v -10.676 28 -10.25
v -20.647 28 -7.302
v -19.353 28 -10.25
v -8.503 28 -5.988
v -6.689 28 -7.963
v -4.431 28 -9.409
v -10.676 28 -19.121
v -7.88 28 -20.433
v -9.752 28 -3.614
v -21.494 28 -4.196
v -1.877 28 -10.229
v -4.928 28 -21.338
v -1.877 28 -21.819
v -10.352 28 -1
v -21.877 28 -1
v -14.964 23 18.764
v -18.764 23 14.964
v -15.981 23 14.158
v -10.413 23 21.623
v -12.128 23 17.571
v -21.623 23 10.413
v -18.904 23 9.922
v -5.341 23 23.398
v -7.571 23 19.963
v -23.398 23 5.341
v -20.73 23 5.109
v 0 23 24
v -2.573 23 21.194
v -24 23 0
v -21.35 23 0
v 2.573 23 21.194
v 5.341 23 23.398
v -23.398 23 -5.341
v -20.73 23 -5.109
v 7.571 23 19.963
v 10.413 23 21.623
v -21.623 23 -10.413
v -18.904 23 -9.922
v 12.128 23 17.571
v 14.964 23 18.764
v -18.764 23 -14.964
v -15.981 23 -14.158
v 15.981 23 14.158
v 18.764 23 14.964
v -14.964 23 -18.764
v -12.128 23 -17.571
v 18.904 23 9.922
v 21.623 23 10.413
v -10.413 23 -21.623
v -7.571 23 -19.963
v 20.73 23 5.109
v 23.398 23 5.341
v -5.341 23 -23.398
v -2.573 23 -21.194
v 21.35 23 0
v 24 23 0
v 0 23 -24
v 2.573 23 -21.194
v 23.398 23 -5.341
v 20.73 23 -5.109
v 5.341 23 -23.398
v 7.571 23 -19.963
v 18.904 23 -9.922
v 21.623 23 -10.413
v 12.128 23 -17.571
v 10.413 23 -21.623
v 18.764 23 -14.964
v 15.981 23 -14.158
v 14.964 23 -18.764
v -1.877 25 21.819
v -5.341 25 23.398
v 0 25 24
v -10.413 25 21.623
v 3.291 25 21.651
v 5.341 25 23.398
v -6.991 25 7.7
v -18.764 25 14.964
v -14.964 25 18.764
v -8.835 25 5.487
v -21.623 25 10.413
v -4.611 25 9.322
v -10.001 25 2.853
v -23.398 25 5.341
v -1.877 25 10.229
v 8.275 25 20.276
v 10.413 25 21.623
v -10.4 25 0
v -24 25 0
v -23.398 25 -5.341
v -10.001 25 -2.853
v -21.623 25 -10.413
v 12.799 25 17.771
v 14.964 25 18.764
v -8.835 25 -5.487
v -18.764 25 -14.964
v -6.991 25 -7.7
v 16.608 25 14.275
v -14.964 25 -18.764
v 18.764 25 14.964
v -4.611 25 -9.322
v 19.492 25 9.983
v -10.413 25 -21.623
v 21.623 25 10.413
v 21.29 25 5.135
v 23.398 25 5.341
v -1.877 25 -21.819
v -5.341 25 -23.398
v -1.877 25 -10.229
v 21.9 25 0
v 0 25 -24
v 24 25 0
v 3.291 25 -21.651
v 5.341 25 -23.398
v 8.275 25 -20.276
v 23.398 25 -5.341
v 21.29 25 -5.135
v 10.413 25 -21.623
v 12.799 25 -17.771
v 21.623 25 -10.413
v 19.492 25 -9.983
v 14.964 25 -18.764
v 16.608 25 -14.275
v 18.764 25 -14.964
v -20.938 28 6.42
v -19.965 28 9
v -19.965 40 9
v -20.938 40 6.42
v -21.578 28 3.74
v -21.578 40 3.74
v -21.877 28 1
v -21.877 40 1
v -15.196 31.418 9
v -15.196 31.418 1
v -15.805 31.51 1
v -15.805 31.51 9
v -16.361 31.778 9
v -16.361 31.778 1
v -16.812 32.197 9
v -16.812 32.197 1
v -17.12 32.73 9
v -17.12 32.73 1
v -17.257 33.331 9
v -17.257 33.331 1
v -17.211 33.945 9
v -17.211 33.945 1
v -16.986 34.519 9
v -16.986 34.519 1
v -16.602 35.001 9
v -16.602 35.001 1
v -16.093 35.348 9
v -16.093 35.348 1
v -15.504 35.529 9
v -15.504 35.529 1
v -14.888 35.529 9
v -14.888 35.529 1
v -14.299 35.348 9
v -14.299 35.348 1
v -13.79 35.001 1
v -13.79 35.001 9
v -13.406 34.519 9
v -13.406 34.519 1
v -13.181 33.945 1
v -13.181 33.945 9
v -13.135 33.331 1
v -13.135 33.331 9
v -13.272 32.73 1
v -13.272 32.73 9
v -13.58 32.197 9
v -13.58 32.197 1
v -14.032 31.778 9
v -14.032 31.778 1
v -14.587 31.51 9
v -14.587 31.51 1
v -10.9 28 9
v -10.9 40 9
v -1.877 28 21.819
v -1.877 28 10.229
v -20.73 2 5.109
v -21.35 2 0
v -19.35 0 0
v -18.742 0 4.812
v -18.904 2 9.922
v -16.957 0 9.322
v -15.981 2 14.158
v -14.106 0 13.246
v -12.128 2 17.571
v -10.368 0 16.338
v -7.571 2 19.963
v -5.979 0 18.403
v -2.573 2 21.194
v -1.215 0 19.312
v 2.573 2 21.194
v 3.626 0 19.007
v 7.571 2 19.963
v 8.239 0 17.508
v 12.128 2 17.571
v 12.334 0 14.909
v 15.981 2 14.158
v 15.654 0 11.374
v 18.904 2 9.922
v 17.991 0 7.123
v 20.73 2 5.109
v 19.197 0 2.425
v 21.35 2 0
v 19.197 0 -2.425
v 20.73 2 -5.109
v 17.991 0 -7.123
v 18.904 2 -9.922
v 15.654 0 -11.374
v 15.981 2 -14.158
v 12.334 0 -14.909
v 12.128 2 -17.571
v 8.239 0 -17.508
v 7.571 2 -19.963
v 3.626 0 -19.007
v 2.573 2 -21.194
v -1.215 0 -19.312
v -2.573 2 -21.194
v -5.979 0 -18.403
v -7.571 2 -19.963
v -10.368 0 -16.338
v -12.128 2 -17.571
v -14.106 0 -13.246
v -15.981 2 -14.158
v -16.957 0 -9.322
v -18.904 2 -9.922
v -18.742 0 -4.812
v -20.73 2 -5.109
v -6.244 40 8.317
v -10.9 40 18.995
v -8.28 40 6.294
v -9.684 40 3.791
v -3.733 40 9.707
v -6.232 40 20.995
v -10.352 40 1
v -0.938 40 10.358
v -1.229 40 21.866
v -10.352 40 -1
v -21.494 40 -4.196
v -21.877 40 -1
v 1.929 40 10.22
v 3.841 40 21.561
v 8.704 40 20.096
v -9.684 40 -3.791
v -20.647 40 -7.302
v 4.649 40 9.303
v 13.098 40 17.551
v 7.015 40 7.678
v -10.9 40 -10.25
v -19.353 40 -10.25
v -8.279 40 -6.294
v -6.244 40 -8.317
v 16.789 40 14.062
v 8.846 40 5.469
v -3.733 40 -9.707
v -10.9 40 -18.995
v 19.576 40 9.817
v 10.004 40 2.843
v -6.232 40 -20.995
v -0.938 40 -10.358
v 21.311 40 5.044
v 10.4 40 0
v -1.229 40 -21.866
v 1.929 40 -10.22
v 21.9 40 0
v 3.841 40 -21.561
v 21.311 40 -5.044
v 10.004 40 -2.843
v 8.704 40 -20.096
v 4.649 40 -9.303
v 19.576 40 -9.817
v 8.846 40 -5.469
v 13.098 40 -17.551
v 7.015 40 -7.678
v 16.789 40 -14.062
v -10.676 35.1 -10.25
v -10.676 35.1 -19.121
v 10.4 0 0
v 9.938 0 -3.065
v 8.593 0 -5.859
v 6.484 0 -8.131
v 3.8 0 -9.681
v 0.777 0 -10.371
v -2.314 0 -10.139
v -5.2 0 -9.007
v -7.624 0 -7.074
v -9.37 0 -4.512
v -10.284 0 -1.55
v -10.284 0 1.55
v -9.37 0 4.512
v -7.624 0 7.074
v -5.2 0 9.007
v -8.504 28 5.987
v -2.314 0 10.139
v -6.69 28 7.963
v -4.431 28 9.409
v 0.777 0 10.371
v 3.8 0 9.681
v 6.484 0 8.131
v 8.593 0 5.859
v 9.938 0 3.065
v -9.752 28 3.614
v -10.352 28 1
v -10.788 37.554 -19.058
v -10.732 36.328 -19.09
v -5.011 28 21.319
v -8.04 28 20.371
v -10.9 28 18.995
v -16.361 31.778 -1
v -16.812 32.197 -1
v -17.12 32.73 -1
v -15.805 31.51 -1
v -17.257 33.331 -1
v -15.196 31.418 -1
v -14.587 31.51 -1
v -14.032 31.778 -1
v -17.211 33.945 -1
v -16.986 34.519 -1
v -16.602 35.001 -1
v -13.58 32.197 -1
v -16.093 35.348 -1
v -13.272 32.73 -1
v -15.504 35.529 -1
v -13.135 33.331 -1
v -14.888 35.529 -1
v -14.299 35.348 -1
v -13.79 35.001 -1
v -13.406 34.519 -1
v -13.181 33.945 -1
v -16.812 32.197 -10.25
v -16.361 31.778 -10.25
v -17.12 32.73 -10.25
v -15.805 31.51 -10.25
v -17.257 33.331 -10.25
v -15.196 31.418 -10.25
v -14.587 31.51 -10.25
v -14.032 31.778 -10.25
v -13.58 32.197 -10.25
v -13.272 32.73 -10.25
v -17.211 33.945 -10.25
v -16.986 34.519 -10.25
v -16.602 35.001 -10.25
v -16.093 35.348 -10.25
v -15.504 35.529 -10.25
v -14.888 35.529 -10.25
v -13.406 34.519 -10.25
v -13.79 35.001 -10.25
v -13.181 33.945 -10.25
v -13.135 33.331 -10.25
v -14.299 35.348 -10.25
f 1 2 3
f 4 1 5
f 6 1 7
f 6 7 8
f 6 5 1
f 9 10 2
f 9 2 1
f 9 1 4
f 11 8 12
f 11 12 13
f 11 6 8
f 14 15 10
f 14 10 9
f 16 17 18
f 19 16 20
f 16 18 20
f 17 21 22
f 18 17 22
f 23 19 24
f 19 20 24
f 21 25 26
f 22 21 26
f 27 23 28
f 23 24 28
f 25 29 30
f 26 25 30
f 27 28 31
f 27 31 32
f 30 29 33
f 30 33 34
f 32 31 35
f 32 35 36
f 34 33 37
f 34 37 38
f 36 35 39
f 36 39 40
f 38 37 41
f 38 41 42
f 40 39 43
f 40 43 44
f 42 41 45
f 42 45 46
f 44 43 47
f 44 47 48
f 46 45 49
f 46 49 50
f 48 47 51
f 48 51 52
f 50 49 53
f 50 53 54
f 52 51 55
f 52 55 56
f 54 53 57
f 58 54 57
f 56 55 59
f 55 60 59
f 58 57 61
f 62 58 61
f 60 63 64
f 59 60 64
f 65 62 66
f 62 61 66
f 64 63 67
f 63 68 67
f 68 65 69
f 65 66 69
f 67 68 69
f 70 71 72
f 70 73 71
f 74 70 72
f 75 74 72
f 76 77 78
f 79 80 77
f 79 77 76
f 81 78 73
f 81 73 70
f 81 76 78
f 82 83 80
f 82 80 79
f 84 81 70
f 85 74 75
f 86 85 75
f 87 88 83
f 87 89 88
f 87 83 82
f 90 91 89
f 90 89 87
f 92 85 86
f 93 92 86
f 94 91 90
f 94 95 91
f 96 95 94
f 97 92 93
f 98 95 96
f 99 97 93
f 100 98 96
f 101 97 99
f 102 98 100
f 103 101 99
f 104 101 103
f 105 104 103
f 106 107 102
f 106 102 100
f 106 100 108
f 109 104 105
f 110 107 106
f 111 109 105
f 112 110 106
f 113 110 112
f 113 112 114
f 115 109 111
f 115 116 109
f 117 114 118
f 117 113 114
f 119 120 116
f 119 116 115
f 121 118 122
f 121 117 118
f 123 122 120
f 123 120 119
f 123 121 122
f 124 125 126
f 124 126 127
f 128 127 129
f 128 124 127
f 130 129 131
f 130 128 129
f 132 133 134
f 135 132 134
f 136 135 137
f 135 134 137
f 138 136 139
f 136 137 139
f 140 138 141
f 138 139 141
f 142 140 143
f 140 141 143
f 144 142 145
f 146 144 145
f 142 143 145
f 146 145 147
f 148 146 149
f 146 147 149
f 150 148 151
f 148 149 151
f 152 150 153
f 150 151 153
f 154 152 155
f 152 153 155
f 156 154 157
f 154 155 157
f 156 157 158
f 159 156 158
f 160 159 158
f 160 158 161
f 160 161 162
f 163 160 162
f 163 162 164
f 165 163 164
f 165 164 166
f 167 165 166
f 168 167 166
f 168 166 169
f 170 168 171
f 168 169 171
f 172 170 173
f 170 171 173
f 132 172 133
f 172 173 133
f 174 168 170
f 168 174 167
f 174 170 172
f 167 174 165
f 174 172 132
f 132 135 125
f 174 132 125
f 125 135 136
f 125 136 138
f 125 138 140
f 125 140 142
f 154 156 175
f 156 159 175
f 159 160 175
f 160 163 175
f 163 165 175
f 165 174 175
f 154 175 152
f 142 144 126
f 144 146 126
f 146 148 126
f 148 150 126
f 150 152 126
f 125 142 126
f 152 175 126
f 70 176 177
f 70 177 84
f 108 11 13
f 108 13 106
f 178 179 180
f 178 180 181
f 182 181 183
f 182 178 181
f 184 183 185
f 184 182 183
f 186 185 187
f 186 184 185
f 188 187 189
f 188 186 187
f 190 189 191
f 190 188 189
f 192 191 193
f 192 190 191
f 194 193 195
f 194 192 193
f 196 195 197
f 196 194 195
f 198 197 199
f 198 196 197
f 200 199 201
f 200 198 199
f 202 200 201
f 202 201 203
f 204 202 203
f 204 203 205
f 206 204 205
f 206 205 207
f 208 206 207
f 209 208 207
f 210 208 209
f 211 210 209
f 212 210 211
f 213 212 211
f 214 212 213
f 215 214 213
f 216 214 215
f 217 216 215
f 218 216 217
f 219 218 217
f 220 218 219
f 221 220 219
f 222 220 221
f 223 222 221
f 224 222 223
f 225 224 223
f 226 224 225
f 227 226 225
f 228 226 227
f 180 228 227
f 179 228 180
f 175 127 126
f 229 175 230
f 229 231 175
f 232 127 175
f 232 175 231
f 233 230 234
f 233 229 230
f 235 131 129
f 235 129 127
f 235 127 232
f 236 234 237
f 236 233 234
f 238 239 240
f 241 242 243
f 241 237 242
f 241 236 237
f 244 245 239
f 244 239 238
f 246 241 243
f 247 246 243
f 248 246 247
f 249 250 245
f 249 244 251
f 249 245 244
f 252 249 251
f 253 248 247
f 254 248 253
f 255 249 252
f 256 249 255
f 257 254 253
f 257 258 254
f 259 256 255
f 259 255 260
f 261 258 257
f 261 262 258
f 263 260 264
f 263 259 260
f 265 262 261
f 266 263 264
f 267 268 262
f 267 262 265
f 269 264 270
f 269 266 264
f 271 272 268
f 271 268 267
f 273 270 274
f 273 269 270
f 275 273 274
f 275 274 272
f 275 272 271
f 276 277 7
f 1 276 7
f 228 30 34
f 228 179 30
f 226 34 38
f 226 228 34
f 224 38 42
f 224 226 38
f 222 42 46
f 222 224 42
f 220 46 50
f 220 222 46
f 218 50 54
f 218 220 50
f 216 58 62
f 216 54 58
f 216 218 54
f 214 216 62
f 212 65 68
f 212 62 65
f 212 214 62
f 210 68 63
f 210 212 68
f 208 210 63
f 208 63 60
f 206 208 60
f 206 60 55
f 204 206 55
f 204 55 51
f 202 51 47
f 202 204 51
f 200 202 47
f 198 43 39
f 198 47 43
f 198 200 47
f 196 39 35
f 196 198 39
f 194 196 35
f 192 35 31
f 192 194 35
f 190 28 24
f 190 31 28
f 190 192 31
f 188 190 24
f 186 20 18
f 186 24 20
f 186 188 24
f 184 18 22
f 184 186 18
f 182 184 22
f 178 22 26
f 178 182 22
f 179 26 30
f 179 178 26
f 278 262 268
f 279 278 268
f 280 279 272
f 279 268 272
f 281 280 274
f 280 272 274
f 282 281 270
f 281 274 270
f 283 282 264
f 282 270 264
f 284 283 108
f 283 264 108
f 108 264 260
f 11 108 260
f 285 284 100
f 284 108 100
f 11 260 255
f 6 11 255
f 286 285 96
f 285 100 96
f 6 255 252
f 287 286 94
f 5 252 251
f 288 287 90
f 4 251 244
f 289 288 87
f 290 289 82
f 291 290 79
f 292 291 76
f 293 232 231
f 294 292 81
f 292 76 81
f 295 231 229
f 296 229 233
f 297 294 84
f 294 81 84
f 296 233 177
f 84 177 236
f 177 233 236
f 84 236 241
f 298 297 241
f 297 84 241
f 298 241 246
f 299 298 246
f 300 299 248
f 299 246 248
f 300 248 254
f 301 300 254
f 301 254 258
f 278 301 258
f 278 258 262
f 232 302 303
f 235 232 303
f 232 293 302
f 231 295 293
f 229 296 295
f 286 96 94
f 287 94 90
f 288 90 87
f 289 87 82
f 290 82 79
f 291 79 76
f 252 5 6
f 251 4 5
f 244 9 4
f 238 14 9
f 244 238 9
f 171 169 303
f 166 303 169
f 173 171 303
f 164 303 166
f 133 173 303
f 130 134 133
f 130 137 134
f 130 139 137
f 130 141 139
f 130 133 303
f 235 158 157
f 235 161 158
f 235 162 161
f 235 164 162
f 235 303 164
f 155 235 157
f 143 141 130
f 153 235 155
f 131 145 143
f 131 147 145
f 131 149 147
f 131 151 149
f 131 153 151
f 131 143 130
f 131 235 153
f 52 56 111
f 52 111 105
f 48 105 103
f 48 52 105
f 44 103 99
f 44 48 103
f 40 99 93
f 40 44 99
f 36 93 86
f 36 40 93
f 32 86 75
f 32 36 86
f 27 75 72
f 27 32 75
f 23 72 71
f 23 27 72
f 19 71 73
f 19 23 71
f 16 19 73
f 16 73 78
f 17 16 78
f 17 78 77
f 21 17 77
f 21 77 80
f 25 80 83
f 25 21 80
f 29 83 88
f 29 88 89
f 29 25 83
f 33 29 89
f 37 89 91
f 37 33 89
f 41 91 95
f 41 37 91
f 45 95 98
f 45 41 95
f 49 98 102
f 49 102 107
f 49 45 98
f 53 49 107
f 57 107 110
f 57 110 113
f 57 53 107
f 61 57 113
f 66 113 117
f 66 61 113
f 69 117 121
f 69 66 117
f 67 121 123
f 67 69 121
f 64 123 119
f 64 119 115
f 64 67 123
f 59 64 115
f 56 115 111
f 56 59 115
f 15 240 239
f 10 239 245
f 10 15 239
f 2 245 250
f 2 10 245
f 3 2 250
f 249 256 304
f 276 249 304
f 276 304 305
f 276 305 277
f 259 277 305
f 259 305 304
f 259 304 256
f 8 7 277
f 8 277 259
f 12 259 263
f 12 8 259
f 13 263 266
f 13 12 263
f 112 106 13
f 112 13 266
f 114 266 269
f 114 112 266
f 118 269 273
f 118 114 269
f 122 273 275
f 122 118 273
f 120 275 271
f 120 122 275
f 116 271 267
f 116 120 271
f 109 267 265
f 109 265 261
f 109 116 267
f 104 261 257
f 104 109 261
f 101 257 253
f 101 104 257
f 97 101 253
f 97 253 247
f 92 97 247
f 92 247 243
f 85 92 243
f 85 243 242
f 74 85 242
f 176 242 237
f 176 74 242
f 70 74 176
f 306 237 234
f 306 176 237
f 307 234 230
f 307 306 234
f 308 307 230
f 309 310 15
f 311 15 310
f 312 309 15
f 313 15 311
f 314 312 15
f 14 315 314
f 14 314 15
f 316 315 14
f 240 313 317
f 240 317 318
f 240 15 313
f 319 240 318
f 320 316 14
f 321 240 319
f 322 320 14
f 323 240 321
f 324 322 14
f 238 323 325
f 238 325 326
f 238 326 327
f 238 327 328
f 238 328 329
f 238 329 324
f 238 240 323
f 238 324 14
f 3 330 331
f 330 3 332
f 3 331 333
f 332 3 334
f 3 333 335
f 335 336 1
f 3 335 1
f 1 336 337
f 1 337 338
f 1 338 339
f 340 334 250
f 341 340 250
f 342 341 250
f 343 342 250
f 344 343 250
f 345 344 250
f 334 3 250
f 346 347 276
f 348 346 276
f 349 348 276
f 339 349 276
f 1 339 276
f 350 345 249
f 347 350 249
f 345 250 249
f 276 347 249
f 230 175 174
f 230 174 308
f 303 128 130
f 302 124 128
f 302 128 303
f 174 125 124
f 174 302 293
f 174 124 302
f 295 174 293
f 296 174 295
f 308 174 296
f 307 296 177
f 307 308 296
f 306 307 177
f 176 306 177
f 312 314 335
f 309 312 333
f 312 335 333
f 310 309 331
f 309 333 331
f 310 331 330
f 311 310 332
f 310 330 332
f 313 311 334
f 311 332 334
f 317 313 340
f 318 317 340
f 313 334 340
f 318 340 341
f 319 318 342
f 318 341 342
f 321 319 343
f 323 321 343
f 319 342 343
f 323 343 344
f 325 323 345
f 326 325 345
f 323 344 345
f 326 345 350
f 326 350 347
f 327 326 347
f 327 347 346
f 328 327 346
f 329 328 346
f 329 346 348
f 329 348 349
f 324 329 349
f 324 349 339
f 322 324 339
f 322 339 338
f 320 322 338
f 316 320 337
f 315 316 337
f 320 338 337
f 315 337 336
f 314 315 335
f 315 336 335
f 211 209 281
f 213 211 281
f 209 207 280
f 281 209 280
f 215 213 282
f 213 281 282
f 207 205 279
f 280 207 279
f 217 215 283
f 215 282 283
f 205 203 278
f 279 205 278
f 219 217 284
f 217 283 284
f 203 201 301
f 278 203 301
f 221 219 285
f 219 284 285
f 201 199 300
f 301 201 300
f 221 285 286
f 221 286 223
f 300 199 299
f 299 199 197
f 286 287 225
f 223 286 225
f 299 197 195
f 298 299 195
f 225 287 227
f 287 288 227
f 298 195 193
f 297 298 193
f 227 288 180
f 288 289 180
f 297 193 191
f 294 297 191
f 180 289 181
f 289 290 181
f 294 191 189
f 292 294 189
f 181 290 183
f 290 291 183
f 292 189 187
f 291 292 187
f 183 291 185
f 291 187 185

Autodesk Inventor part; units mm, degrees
ref_plane "YZ Plane" through (0, 0, 0) normal (1, 0, 0) x (0, 1, 0)
ref_plane "XZ Plane" through (0, 0, 0) normal (0, 1, 0) x (-1, 0, 0)
ref_plane "XY Plane" through (0, 0, 0) normal (0, 0, 1) x (1, 0, 0)
sketch "Sketch1" plane through (0, 0, 0) normal (0, 1, 0) x (-1, 0, 0)
  circle A0 centre (0, 0) radius 21.35
  dimension "d0" = 42.7
extrude "Extrusion1" add sketch "Sketch1" along normal blind 23
sketch "Sketch2" plane through (0, 23, 0) normal (0, 1, 0) x (1, 0, 0)
  circle A0 centre (0, 0) radius 24
  dimension "d3" = 48
extrude "Extrusion2" add sketch "Sketch2" along normal blind 2
sketch "Sketch3" plane through (0, 25, 0) normal (0, 1, 0) x (1, 0, 0)
  circle A0 centre (0, 0) radius 24 projected
  circle A1 centre (0, 0) radius 21.9
  dimension "d6" = 43.8
extrude "Extrusion3" add sketch "Sketch3" along normal blind 15 contours A1
sketch "Sketch5" plane through (0, 40, 0) normal (0, 1, 0) x (1, 0, 0)
  line L0 (0, 0) -> (-16.9119, 0)
  line L1 (-16.9119, 0) -> (-16.9119, 11.9609)
  line L2 (-16.9119, 11.9609) -> (0, 11.9609)
  line L3 (0, 11.9609) -> (0, 0)
sketch "Sketch8" plane through (0, 40, 0) normal (0, 1, 0) x (1, 0, 0)
  circle A0 centre (0, 0) radius 10.4
  dimension "d18" = 20.8
extrude "Extrusion5" cut sketch "Sketch8" against normal through all
sketch "Sketch9" plane through (0, 40, 0) normal (0, 1, 0) x (1, 0, 0)
  arc A0 (-20.347, 8.1) -> (20.347, 8.1) centre (0, 0) ccw projected
  line L0 (-21.9, 0) -> (-10.9, 0)
  line L1 (-10.9, 0) -> (-10.9, -21.2976)
  line L2 (-10.9, -21.2976) -> (-22.7633, -21.2976)
  line L3 (-22.7633, -21.2976) -> (-22.7633, 0)
  line L4 (-22.7633, 0) -> (-21.9, 0)
  line L5 (-22.7633, 0) -> (-22.7633, 1)
  line L6 (-22.7633, 1) -> (-8.5921, 1)
  line L7 (-8.5921, 1) -> (-8.5921, -0.9996)
  line L8 (-8.5921, -0.9996) -> (-22.7633, -0.9996)
  line L9 (-10.9, -0.9996) -> (-10.9, -8.9996)
  line L10 (-10.9, -8.9996) -> (-22.7633, -8.9996)
  point P0 (-19.9654, -8.9996)
  point P1 (-10.9, -18.9947)
  dimension "d21" = 11
  dimension "d22" = 1
  dimension "d23" = 8
extrude "Extrusion6" cut sketch "Sketch9" against normal blind 15 contours L6 L7 L8 L1 L0 A0 | A0 L4 L5 L6 | L0 L1 L8 A0 | A0 L8 L3 L4 | L10 L1 A0
sketch "Sketch10" plane through (-19.9654, 40, 8.9996) normal (0, 0, 1) x (1, 0, 0)
  circle A0 centre (4.7692, -6.5146) radius 2.55
  point P0 (19.9654, -40)
  dimension "d26" = 5.1
hole "Hole1" at (-15.1962, 33.4854, 8.9996) direction (0, 0, -1) diameter 4.134 end through all thread size "M5x0.8" class "6H" standard "ISO Metric profile"
chamfer "Chamfer1" distance 2 angle 45 1 edges at (21.35, 0, 0)
ref_plane "Work Plane4" through (-21.8772, 40, -0.0002) normal (0, 0, 1) x (1, 0, 0)
ref_plane "Work Plane5" through (-21.8772, 40, 21.9998) normal (0, 0, 1) x (1, 0, 0)
sketch "Sketch11" plane through (-21.8772, 40, 21.9998) normal (0, 0, 1) x (1, 0, 0)
  line L0 (0, -15) -> (1.9118, -15) projected
  line L1 (0, -15) -> (0, -12)
  line L2 (0, 0) -> (0, -15) projected
  line L3 (0, -12) -> (20, -12)
  line L4 (20, -12) -> (20, -15)
  line L5 (20, -15) -> (0, -15)
  line L6 (45.8772, -15) -> (-2.1228, -15) projected
  point P0 (21.8772, -40)
  point P1 (10.9772, -15)
  dimension "d39" = 3
  dimension "d42" = 20
extrude "Extrusion7" cut sketch "Sketch11" against normal through all
ref_plane "Work Plane6" through (-21.8772, 40, -18.2502) normal (0, 0, 1) x (1, 0, 0)
sketch "Sketch13" plane through (-21.8772, 40, -18.2502) normal (0, 0, 1) x (1, 0, 0)
  line L0 (11.5253, 0) -> (11.5253, -12) projected
  line L1 (10.9772, 0) -> (11.5253, -12)
  line L2 (0, -12) -> (0, 0) projected
  line L3 (11.5253, -12) -> (0, -12)
  line L4 (0, -12) -> (0, 0)
  line L5 (0, 0) -> (11.201, 0)
  line L6 (1.9118, 0) -> (10.9772, 0) projected
  line L7 (11.201, 0) -> (11.201, -12)
  line L8 (11.5253, -12) -> (0, -12) projected
  point P0 (21.8772, -40)
  point P1 (11.201, -4.9004)
extrude "Extrusion9" cut sketch "Sketch13" along normal mid plane 16 contours L1 L7 L3 L2 L5
properties part number "Probe holder"
